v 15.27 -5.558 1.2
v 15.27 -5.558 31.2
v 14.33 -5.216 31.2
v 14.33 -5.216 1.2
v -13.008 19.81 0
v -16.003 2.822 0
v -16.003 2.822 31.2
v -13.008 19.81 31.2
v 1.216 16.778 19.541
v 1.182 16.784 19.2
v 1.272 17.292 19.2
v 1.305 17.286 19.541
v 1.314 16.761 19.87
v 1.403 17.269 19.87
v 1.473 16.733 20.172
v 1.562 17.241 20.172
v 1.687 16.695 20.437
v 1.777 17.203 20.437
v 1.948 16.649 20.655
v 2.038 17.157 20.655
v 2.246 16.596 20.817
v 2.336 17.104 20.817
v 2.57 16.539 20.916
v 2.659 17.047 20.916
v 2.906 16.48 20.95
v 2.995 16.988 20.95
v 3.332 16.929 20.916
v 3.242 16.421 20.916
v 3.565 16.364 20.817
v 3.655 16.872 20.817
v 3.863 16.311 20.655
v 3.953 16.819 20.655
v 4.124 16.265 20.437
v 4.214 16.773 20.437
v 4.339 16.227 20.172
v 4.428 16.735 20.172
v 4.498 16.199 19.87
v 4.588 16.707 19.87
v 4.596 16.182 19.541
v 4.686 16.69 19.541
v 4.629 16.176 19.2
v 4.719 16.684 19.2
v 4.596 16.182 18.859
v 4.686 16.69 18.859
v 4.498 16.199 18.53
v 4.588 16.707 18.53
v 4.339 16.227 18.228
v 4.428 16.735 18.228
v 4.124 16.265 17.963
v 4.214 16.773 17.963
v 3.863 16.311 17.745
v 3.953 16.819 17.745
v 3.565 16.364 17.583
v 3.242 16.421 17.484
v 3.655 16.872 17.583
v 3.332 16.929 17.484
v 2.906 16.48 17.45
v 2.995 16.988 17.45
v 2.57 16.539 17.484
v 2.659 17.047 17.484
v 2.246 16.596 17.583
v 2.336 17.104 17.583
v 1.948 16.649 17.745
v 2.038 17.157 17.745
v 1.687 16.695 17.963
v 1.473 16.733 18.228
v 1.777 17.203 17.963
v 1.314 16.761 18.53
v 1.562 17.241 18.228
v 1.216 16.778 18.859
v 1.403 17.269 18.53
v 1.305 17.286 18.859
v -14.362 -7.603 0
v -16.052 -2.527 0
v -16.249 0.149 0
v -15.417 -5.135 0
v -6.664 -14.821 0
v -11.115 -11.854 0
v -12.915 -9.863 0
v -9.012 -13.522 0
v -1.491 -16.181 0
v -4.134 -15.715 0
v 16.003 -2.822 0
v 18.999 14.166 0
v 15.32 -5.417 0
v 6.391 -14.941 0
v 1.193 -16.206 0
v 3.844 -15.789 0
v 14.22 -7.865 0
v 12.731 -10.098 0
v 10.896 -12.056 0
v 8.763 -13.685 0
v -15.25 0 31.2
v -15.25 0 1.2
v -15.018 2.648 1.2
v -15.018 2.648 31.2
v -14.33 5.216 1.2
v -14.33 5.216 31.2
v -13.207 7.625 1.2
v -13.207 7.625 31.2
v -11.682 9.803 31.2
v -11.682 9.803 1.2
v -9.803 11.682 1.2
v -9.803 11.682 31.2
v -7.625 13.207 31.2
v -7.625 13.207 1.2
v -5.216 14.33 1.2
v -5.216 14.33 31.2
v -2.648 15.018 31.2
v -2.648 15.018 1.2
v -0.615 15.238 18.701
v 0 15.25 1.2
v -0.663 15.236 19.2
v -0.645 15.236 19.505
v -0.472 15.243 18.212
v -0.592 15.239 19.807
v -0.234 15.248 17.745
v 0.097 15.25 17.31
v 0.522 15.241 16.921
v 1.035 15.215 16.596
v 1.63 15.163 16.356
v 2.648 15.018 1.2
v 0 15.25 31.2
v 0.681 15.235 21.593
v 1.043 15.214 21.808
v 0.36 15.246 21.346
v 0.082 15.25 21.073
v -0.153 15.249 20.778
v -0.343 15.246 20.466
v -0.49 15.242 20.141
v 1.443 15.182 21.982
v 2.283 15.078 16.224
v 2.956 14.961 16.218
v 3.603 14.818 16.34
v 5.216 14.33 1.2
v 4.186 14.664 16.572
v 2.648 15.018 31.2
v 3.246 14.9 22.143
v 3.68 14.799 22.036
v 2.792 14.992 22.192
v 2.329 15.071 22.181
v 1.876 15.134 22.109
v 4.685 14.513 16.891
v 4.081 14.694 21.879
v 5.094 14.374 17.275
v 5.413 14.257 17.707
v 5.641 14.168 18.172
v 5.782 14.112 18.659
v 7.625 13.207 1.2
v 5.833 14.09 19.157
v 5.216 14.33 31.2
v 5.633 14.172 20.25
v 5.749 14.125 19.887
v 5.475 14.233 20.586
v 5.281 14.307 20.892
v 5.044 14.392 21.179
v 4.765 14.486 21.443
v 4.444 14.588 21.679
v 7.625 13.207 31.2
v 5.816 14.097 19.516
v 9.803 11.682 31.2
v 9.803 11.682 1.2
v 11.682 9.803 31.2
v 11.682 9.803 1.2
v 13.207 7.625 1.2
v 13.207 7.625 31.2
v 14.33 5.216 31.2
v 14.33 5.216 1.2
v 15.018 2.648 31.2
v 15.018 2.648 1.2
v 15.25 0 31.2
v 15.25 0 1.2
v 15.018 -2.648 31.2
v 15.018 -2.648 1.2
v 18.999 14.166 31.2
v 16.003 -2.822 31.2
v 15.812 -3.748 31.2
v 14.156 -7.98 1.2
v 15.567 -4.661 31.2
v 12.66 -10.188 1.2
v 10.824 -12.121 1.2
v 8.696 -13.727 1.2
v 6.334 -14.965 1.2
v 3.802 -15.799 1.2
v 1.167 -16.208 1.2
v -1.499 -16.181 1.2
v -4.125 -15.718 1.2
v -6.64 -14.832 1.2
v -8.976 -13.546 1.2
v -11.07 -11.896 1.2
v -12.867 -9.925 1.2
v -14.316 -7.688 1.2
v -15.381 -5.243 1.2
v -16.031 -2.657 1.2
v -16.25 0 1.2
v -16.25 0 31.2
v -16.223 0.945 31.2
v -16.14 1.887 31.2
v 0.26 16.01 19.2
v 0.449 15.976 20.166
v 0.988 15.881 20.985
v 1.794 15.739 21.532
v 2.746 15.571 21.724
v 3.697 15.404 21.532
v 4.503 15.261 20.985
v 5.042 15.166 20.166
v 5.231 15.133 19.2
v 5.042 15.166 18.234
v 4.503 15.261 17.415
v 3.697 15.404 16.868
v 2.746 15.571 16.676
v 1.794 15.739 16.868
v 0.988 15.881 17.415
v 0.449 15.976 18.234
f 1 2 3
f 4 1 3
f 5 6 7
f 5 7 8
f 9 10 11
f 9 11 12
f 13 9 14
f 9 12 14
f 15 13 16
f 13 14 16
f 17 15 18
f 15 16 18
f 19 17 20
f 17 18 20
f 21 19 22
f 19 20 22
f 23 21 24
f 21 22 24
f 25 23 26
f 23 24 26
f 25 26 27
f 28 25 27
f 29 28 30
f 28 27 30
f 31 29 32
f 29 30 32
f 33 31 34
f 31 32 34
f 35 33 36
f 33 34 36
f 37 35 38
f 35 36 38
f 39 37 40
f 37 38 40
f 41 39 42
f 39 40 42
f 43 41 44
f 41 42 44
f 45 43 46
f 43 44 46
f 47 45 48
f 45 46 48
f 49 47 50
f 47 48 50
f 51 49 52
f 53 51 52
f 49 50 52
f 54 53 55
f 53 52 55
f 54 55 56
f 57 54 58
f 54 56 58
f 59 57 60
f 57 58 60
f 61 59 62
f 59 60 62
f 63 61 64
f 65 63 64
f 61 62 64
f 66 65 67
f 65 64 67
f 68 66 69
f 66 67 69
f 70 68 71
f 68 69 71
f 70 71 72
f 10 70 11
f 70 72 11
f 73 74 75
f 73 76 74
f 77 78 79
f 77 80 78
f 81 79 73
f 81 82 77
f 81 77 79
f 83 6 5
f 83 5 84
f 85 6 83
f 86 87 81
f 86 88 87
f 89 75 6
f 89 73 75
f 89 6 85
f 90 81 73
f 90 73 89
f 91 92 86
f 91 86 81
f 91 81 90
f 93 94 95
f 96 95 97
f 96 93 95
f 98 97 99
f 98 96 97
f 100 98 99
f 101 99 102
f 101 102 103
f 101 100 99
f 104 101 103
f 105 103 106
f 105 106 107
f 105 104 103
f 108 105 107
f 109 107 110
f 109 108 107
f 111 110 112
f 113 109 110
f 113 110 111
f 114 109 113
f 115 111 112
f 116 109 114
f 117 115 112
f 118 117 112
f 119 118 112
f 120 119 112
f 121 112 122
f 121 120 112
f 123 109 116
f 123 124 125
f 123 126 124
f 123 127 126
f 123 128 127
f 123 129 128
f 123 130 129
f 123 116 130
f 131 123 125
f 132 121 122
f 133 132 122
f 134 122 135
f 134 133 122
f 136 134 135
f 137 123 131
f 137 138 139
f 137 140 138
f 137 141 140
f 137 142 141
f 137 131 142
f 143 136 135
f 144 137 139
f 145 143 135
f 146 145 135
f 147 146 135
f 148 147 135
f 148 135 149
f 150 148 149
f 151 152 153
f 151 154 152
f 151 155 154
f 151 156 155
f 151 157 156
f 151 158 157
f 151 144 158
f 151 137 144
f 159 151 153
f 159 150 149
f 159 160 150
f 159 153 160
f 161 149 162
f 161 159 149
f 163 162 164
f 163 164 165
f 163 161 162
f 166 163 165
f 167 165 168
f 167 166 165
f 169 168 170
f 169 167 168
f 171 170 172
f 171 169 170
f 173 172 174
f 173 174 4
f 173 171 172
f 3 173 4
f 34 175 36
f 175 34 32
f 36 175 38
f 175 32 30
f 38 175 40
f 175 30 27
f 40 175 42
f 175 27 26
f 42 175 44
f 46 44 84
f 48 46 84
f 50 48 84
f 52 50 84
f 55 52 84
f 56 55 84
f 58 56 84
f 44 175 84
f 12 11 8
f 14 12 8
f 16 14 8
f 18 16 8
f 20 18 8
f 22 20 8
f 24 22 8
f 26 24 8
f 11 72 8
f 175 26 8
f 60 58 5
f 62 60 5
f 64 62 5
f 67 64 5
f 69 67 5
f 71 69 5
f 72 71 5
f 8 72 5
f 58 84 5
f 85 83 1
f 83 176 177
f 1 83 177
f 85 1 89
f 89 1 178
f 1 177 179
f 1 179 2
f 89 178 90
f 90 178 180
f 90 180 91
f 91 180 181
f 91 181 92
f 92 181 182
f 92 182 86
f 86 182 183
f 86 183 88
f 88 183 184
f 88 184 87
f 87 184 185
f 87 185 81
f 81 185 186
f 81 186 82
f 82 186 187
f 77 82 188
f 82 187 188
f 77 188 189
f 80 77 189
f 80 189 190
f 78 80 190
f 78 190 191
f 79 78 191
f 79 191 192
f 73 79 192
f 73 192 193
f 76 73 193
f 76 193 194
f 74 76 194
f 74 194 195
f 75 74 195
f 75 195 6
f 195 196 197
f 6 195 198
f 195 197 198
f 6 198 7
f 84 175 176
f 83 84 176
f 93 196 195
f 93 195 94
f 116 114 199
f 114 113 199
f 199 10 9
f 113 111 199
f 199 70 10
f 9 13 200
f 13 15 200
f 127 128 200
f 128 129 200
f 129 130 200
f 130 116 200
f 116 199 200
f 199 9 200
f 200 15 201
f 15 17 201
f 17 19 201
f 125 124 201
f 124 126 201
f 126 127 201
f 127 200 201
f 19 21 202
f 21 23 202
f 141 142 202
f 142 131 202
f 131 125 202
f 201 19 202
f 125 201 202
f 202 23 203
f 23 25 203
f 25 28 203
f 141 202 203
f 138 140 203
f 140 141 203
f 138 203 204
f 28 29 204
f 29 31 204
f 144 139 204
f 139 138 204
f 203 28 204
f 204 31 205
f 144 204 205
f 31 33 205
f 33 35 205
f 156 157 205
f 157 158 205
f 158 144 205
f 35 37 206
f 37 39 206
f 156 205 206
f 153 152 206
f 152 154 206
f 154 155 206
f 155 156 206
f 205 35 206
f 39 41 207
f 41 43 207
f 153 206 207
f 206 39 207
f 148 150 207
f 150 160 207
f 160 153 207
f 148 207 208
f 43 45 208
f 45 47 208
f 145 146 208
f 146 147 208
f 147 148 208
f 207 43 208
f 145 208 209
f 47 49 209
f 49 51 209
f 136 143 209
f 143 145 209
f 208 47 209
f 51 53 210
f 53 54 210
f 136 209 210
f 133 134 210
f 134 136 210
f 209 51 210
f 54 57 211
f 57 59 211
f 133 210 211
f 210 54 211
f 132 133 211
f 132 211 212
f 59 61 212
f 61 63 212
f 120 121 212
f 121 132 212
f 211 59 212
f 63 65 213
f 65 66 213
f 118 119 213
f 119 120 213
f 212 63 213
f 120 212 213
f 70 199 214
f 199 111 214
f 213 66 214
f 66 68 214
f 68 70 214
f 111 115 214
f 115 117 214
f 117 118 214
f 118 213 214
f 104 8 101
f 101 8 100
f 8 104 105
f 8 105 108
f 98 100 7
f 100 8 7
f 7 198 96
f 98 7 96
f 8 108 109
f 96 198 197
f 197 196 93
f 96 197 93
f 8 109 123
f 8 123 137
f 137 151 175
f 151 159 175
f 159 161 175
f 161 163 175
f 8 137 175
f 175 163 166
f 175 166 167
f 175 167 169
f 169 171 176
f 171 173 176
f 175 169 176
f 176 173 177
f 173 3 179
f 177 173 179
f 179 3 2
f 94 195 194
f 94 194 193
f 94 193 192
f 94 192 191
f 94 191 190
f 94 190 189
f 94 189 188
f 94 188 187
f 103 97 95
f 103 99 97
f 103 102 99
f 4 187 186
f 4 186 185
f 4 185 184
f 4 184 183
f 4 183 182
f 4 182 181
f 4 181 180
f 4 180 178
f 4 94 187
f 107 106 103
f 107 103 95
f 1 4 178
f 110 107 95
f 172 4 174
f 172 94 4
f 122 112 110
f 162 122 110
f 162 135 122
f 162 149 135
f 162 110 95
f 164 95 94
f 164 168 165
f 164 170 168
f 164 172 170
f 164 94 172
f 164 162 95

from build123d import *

# Parameters (mm, degrees)
SKETCH_R         = 16.25
PAD_DEPTH        = 1.2
SKETCH001_W      = 1
SKETCH001_H      = 30
REVOLUTION_ANGLE = -200
PAD001_DEPTH     = 31.2
PAD002_DEPTH     = 10
HOLE_D           = 3.5
HOLE_DEPTH       = 5.85
HOLE_CSINK_D     = 7
HOLE_CSINK_ANGLE = 80
POCKET_DEPTH     = 10


with BuildPart() as part:
    # Sketch → Pad (new body)
    with BuildSketch(Plane.XY):
        Circle(SKETCH_R)
    extrude(amount=PAD_DEPTH)

    # Sketch001 → Revolution (revolve)
    with BuildSketch(Plane.XZ):
        with Locations((-15.75, 16.2)):
            Rectangle(SKETCH001_W, SKETCH001_H)
    revolve(axis=Axis((0, 0, 0), (0, 0, 1)), revolution_arc=REVOLUTION_ANGLE)

    # Sketch002 (on Face2 of Revolution) → Pad001 (join)
    with BuildSketch(Plane(origin=(0, 0, 0), x_dir=(1, 0, 0), z_dir=(0, 0, -1))):
        with BuildLine():
            Line((-16.0031258461, -2.8217836832), (-13.0076949217, -19.8097166265))
            Line((-13.0076949217, -19.8097166265), (18.9985570512, -14.1661508524))
            Line((18.9985570512, -14.1661508524), (16.0031261337, 2.8217820519))
            ThreePointArc((-16.0031258461, -2.8217836832), (2.8217828675, -16.0031259899), (16.0031261337, 2.8217820519))
        make_face()
    extrude(amount=-PAD001_DEPTH)

    # Sketch003 (on Face12 of Pad001) → Pad002 (join)
    with BuildSketch(Plane.XY.offset(31.2)):
        Polygon((-13.0076949217, 19.8097166265), (-13.4594399549, 17.2477432325), (18.546812018, 11.6041774583), (18.9985570512, 14.1661508524), align=None)
    extrude(amount=PAD002_DEPTH)

    # Hole
    with Locations(Plane(origin=(2.5436860315, 14.4259603454, 0), x_dir=(0.984807753, -0.1736481777, 0), z_dir=(-0.1736481777, -0.984807753, 0))):
        with Locations((0, 19.2)):
            CounterSinkHole(HOLE_D / 2, HOLE_CSINK_D / 2, depth=HOLE_DEPTH, counter_sink_angle=HOLE_CSINK_ANGLE)

    # Sketch005 (on Face22 of Hole) → Pocket (cut)
    with BuildSketch(Plane.XY.offset(41.2)):
        Polygon((-13.0076949217, 19.8097166265), (-13.4594399549, 17.2477432325), (18.546812018, 11.6041774583), (18.9985570512, 14.1661508524), align=None)
    extrude(amount=-POCKET_DEPTH, mode=Mode.SUBTRACT)


solid = part.part
